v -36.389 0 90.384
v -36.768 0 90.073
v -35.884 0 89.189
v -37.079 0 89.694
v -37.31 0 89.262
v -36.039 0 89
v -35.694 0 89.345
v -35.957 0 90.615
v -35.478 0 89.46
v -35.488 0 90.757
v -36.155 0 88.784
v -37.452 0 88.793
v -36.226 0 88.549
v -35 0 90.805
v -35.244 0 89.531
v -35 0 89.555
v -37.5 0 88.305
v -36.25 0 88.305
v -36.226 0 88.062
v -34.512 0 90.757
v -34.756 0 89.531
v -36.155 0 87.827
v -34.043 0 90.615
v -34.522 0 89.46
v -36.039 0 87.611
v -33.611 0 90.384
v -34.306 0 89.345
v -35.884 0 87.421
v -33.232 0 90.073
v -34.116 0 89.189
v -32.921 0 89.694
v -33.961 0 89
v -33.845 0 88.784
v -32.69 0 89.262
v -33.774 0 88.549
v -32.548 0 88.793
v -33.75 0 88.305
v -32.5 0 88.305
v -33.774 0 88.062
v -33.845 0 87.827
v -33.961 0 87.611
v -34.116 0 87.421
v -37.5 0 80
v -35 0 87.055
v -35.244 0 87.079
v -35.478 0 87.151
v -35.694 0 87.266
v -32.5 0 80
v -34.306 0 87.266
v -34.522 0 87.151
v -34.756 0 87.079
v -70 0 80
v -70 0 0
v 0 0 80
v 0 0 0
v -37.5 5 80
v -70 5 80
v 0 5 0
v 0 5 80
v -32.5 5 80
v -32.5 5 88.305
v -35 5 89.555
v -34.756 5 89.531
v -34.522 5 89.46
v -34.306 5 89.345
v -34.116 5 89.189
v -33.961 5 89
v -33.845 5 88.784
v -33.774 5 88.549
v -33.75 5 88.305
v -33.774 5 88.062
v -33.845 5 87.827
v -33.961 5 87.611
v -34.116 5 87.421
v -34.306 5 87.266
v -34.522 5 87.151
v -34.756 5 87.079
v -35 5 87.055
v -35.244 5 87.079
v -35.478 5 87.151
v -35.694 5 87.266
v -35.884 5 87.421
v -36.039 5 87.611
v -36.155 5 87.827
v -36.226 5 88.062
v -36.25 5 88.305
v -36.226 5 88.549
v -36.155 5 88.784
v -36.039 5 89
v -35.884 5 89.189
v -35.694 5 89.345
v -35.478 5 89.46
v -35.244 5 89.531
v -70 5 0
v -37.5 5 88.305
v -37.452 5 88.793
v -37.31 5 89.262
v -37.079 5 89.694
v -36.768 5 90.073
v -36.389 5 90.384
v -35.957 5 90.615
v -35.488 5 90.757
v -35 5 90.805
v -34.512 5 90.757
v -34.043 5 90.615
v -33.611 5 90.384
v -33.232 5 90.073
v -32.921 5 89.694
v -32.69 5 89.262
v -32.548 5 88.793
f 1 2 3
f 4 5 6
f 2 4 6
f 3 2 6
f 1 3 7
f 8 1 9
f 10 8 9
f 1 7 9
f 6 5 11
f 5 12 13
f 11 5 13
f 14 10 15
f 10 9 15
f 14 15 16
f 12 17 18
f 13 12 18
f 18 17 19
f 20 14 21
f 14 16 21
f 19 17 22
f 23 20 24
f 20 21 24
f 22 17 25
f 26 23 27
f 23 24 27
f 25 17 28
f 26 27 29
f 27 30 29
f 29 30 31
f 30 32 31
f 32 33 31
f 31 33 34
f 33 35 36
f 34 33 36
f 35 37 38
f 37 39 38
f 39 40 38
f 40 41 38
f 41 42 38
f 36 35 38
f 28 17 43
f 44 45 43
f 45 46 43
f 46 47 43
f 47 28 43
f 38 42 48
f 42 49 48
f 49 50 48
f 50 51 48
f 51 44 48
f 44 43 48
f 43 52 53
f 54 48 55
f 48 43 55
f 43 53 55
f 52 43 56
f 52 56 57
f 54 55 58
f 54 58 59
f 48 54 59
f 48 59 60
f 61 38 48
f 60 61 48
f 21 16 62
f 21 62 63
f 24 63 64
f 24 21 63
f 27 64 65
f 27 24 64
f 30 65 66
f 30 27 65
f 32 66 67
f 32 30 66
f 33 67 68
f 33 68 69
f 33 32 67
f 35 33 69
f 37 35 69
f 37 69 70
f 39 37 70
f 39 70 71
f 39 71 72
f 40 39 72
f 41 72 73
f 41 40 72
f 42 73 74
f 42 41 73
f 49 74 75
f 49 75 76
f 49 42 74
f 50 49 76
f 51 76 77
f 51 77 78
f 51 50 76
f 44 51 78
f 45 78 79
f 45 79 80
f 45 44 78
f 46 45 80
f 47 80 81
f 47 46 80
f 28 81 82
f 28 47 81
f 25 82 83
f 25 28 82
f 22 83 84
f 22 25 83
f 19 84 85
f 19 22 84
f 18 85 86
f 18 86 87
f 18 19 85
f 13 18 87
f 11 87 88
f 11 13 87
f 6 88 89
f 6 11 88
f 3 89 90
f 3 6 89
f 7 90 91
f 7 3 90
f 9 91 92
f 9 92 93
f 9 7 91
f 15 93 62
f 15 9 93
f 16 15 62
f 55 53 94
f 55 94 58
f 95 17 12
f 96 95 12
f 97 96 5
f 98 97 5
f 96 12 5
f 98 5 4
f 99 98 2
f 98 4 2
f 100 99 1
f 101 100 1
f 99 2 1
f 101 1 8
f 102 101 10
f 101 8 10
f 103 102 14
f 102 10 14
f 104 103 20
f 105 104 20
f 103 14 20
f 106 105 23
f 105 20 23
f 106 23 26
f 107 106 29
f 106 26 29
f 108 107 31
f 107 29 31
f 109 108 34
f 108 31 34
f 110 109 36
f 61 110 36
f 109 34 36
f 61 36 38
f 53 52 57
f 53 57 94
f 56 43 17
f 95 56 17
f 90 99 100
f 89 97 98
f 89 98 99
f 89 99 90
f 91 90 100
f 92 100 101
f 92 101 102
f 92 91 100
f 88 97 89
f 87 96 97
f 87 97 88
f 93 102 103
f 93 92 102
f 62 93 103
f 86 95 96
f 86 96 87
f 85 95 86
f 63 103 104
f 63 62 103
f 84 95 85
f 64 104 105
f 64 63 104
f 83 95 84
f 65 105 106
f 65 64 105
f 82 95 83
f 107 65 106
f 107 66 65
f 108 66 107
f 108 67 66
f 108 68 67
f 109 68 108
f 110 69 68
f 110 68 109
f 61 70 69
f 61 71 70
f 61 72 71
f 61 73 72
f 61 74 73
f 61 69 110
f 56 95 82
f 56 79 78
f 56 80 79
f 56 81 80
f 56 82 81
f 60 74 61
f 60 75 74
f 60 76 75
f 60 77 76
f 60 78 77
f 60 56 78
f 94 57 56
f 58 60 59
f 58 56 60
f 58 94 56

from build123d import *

# Parameters (mm, degrees)
SKETCH1_R           = 1.25
BOSS_EXTRUDE1_DEPTH = 5


with BuildPart() as part:
    # Sketch1 → Boss-Extrude1 (new body)
    with BuildSketch(Plane(origin=(0, 0, 0), x_dir=(1, 0, 0), z_dir=(0, 1, 0))):
        with BuildLine():
            Line((0, -80), (0, 0))
            Line((0, 0), (-70, 0))
            Line((-70, 0), (-70, -80))
            Line((-70, -80), (-37.5, -80))
            Line((-37.5, -80), (-37.5, -88.305370533))
            ThreePointArc((-37.5, -88.305370533), (-35, -90.805370533), (-32.5, -88.305370533))
            Line((-32.5, -88.305370533), (-32.5, -80))
            Line((-32.5, -80), (0, -80))
        make_face()
        with Locations((-35, -88.305370533)):
            Circle(SKETCH1_R, mode=Mode.SUBTRACT)
    extrude(amount=BOSS_EXTRUDE1_DEPTH)


solid = part.part
